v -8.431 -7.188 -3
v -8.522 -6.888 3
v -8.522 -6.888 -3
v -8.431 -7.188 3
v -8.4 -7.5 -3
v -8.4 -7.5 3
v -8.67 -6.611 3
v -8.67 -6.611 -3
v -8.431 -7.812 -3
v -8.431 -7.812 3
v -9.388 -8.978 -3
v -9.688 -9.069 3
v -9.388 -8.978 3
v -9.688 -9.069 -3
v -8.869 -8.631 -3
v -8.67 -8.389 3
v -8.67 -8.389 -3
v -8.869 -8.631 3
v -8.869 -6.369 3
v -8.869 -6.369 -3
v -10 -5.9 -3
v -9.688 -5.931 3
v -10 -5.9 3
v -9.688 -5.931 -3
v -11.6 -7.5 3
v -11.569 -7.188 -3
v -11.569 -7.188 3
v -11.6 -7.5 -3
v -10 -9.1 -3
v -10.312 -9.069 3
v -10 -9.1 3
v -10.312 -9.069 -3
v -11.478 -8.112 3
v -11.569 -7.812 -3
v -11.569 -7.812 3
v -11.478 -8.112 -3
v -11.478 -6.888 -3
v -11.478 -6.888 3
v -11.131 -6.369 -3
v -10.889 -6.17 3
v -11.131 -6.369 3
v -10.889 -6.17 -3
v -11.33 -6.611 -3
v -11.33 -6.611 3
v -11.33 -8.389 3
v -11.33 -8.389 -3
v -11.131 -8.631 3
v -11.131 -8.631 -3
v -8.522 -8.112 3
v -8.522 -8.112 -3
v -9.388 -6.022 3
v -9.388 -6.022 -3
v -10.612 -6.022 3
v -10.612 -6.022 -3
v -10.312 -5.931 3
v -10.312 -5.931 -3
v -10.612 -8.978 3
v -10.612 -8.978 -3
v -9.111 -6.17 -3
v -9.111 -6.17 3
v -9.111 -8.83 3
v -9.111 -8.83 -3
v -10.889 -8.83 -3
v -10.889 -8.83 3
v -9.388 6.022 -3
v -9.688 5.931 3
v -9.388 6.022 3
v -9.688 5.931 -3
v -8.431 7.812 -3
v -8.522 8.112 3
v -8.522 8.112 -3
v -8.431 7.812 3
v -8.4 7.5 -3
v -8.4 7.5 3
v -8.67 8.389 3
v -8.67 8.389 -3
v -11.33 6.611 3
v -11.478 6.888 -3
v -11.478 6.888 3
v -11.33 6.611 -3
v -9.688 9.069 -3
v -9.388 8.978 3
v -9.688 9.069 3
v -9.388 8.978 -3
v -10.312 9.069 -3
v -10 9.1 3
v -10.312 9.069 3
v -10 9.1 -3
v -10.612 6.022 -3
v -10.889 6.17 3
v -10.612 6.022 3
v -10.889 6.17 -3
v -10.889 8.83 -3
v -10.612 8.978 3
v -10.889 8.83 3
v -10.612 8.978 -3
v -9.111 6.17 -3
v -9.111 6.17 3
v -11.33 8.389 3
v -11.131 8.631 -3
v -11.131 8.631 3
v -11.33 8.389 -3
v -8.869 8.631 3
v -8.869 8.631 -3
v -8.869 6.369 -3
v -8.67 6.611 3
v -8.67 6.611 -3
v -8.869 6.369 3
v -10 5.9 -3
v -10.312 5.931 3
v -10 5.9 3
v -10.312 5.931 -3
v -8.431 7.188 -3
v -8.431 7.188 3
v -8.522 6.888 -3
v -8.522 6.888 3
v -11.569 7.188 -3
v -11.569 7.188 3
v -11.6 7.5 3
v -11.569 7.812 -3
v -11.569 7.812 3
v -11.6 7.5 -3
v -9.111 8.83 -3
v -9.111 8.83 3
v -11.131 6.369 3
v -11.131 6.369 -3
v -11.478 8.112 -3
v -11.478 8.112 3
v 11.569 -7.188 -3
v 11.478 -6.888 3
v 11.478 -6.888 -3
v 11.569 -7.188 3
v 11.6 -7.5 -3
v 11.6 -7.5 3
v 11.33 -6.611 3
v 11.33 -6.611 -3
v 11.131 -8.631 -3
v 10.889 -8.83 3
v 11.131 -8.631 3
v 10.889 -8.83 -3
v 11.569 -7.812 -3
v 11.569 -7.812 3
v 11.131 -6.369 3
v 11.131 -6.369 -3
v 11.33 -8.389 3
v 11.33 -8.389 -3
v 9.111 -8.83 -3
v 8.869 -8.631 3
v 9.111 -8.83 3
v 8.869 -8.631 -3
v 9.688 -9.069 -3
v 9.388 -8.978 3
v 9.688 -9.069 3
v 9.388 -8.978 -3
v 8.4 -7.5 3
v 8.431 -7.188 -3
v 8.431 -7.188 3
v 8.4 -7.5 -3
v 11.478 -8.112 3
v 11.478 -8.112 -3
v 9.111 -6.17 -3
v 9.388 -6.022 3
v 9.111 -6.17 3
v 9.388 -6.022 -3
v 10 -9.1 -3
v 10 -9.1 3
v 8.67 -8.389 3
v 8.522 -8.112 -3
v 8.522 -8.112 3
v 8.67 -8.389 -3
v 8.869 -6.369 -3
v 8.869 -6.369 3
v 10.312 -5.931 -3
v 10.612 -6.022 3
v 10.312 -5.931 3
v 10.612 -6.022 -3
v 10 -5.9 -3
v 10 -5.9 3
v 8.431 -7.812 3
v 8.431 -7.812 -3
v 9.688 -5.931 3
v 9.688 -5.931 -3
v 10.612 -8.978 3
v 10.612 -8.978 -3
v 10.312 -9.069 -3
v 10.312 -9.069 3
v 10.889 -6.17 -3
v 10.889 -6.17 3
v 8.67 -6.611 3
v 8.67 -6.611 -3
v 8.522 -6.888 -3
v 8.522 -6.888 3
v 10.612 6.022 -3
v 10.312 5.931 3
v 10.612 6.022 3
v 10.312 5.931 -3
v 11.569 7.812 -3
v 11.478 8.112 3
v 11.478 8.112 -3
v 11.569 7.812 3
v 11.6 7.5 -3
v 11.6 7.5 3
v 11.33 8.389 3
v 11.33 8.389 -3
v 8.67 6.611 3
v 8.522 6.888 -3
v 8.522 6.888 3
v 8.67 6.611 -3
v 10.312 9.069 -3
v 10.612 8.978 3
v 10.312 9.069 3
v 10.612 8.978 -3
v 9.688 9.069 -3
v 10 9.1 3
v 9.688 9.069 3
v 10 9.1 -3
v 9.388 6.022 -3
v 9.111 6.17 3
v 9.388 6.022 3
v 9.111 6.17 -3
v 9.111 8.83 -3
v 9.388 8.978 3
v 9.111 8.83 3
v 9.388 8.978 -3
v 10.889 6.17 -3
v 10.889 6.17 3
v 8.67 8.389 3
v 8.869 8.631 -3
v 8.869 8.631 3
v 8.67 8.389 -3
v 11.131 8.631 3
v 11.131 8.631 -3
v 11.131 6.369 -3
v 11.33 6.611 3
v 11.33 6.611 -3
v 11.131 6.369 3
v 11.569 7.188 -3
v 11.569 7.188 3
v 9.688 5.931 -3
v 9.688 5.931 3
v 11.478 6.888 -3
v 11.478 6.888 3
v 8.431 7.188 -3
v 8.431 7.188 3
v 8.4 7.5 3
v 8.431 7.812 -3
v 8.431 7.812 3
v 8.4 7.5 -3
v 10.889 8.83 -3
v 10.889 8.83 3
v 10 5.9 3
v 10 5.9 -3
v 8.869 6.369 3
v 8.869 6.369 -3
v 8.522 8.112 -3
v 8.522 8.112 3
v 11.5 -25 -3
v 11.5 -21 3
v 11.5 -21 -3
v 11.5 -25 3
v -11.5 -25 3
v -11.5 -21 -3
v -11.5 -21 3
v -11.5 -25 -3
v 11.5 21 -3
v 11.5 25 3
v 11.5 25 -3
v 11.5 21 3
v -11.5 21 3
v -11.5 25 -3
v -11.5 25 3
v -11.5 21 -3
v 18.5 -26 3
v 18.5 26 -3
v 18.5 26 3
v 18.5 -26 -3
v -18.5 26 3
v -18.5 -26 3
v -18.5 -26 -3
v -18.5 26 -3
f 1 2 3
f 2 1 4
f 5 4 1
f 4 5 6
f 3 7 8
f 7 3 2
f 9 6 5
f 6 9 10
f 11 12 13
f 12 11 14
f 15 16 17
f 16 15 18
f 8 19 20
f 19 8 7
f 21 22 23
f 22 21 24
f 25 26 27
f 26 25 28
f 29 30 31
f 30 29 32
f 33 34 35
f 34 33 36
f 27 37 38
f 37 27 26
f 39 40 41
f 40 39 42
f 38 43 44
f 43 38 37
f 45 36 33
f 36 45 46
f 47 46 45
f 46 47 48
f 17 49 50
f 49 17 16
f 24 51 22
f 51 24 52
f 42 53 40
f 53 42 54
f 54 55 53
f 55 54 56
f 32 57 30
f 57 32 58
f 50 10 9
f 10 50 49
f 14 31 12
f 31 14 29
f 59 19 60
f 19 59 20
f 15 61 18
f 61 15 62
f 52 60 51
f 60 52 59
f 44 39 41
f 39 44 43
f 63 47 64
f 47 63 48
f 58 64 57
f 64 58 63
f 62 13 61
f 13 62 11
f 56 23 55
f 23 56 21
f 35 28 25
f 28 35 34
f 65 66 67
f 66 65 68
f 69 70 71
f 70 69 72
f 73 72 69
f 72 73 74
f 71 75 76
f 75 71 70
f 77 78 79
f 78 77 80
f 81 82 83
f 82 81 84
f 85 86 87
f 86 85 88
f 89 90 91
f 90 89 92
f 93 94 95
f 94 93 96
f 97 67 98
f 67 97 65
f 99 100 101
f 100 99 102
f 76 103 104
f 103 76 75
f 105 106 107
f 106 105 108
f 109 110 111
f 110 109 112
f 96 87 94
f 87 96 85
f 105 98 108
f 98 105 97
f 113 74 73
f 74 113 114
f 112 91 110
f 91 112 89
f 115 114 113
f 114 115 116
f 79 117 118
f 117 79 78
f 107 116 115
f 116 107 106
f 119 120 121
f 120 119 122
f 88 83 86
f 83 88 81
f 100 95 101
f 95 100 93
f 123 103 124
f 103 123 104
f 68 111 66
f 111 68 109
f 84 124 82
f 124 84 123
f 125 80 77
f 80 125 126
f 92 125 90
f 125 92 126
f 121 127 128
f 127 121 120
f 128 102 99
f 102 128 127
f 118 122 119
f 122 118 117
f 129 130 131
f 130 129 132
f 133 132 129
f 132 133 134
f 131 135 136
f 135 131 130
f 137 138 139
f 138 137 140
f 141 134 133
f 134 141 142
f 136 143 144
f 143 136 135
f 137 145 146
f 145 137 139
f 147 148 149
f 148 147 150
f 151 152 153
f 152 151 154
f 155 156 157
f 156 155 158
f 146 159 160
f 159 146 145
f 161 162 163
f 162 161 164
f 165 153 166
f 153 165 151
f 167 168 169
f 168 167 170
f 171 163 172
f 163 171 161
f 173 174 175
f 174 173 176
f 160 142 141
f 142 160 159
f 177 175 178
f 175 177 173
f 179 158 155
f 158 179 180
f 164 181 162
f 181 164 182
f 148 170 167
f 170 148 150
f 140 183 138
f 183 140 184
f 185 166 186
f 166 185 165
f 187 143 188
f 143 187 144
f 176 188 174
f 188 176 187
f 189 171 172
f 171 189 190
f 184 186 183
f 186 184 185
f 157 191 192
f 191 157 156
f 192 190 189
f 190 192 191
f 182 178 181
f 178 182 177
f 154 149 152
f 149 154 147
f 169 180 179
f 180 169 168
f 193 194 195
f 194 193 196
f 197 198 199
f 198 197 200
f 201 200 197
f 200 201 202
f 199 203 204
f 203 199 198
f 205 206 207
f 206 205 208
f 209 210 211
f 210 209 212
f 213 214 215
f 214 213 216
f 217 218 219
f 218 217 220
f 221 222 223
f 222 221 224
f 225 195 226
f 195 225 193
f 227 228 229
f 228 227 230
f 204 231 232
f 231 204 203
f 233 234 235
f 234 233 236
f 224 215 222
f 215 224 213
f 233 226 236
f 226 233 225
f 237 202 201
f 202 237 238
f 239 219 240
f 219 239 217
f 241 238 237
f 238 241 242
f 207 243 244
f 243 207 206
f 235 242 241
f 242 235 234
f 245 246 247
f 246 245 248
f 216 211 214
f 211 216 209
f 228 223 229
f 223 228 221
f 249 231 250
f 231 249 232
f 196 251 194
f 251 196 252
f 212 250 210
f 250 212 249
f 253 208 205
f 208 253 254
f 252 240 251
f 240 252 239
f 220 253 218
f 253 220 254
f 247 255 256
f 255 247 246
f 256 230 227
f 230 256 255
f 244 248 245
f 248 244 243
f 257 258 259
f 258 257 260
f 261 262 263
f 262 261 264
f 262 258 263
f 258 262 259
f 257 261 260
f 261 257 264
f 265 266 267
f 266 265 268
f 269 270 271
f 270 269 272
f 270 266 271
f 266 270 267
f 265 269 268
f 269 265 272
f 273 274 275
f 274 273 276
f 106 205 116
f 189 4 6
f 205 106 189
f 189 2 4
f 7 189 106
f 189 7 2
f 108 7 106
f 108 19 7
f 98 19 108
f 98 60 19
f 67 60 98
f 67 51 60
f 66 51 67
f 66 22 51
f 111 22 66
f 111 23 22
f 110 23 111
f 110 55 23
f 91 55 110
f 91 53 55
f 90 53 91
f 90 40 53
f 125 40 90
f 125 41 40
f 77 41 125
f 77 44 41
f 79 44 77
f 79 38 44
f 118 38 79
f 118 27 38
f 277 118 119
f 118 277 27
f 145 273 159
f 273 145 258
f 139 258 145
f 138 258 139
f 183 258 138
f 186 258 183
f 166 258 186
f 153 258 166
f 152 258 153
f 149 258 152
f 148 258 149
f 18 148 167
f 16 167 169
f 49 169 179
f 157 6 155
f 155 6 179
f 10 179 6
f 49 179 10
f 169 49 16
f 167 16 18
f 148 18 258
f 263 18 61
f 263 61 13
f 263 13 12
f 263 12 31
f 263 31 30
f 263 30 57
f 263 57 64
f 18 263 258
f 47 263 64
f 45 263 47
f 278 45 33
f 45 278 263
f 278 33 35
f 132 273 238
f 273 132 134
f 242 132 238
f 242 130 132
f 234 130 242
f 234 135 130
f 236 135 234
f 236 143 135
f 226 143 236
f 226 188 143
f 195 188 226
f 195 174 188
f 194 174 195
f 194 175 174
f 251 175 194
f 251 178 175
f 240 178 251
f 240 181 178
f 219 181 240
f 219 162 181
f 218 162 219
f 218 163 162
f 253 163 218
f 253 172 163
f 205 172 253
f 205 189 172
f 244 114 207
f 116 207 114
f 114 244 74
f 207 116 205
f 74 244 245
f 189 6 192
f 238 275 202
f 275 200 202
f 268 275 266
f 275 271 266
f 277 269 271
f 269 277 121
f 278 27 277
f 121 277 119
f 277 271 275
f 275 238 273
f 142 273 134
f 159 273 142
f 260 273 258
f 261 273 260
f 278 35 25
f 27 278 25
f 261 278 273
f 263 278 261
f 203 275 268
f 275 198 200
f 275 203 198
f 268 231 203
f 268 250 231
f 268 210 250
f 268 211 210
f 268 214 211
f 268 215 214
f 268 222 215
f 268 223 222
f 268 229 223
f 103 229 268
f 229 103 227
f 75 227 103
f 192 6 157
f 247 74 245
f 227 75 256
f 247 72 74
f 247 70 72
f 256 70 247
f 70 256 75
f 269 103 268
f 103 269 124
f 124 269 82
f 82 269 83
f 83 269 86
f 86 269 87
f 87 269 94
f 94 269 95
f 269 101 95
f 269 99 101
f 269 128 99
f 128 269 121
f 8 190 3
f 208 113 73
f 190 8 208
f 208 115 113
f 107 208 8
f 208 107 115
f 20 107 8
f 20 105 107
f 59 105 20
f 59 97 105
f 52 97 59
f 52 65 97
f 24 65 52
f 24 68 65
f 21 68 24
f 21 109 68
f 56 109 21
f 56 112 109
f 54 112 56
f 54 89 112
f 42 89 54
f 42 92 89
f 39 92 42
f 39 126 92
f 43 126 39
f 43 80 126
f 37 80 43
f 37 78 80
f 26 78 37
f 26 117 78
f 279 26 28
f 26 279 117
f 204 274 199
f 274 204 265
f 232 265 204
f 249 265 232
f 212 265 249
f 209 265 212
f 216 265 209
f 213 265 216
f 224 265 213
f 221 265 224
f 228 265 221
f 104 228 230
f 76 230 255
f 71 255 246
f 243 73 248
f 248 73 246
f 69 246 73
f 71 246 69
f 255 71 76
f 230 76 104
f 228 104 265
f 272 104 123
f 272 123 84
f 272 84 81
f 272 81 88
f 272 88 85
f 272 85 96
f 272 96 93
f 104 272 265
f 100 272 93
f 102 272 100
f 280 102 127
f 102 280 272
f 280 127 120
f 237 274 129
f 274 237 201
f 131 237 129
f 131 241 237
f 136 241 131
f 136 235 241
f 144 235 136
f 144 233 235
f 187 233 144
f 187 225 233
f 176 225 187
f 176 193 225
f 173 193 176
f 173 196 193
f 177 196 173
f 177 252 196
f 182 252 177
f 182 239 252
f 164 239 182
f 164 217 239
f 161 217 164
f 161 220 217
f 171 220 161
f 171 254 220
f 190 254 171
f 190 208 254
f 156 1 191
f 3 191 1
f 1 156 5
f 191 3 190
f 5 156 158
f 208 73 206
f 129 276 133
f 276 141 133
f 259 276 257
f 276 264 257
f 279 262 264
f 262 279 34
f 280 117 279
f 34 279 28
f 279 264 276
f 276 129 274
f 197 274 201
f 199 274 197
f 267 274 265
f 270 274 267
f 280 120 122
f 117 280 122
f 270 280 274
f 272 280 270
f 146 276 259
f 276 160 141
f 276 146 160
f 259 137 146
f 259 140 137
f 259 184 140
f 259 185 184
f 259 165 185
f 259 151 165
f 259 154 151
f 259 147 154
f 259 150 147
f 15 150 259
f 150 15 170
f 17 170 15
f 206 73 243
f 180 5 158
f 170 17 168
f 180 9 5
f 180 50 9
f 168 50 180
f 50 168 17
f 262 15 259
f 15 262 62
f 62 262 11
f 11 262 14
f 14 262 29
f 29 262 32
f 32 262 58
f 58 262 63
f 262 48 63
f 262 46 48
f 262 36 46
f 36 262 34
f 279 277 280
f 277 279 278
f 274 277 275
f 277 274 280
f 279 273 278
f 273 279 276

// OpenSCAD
// MGN12 Linear Rail Carriage Mount
// MGN12H: 27mm x 42mm footprint, M3 mounting holes
carriage_width = 27;
carriage_length = 42;
hole_spacing_x = 20;
hole_spacing_y = 15;
mount_thickness = 6;

difference() {
    // Base block
    cube([carriage_width + 10, carriage_length + 10, mount_thickness], center=true);

    // MGN12H mounting holes pattern
    for (x = [-1, 1]) {
        for (y = [-1, 1]) {
            translate([x * hole_spacing_x/2, y * hole_spacing_y/2, 0])
                cylinder(d=3.2, h=mount_thickness+1, center=true, $fn=32);
        }
    }

    // Weight reduction slots
    for (y = [-1, 1]) {
        translate([0, y * (carriage_length/2 + 2), 0])
            cube([carriage_width - 4, 4, mount_thickness+1], center=true);
    }
}
